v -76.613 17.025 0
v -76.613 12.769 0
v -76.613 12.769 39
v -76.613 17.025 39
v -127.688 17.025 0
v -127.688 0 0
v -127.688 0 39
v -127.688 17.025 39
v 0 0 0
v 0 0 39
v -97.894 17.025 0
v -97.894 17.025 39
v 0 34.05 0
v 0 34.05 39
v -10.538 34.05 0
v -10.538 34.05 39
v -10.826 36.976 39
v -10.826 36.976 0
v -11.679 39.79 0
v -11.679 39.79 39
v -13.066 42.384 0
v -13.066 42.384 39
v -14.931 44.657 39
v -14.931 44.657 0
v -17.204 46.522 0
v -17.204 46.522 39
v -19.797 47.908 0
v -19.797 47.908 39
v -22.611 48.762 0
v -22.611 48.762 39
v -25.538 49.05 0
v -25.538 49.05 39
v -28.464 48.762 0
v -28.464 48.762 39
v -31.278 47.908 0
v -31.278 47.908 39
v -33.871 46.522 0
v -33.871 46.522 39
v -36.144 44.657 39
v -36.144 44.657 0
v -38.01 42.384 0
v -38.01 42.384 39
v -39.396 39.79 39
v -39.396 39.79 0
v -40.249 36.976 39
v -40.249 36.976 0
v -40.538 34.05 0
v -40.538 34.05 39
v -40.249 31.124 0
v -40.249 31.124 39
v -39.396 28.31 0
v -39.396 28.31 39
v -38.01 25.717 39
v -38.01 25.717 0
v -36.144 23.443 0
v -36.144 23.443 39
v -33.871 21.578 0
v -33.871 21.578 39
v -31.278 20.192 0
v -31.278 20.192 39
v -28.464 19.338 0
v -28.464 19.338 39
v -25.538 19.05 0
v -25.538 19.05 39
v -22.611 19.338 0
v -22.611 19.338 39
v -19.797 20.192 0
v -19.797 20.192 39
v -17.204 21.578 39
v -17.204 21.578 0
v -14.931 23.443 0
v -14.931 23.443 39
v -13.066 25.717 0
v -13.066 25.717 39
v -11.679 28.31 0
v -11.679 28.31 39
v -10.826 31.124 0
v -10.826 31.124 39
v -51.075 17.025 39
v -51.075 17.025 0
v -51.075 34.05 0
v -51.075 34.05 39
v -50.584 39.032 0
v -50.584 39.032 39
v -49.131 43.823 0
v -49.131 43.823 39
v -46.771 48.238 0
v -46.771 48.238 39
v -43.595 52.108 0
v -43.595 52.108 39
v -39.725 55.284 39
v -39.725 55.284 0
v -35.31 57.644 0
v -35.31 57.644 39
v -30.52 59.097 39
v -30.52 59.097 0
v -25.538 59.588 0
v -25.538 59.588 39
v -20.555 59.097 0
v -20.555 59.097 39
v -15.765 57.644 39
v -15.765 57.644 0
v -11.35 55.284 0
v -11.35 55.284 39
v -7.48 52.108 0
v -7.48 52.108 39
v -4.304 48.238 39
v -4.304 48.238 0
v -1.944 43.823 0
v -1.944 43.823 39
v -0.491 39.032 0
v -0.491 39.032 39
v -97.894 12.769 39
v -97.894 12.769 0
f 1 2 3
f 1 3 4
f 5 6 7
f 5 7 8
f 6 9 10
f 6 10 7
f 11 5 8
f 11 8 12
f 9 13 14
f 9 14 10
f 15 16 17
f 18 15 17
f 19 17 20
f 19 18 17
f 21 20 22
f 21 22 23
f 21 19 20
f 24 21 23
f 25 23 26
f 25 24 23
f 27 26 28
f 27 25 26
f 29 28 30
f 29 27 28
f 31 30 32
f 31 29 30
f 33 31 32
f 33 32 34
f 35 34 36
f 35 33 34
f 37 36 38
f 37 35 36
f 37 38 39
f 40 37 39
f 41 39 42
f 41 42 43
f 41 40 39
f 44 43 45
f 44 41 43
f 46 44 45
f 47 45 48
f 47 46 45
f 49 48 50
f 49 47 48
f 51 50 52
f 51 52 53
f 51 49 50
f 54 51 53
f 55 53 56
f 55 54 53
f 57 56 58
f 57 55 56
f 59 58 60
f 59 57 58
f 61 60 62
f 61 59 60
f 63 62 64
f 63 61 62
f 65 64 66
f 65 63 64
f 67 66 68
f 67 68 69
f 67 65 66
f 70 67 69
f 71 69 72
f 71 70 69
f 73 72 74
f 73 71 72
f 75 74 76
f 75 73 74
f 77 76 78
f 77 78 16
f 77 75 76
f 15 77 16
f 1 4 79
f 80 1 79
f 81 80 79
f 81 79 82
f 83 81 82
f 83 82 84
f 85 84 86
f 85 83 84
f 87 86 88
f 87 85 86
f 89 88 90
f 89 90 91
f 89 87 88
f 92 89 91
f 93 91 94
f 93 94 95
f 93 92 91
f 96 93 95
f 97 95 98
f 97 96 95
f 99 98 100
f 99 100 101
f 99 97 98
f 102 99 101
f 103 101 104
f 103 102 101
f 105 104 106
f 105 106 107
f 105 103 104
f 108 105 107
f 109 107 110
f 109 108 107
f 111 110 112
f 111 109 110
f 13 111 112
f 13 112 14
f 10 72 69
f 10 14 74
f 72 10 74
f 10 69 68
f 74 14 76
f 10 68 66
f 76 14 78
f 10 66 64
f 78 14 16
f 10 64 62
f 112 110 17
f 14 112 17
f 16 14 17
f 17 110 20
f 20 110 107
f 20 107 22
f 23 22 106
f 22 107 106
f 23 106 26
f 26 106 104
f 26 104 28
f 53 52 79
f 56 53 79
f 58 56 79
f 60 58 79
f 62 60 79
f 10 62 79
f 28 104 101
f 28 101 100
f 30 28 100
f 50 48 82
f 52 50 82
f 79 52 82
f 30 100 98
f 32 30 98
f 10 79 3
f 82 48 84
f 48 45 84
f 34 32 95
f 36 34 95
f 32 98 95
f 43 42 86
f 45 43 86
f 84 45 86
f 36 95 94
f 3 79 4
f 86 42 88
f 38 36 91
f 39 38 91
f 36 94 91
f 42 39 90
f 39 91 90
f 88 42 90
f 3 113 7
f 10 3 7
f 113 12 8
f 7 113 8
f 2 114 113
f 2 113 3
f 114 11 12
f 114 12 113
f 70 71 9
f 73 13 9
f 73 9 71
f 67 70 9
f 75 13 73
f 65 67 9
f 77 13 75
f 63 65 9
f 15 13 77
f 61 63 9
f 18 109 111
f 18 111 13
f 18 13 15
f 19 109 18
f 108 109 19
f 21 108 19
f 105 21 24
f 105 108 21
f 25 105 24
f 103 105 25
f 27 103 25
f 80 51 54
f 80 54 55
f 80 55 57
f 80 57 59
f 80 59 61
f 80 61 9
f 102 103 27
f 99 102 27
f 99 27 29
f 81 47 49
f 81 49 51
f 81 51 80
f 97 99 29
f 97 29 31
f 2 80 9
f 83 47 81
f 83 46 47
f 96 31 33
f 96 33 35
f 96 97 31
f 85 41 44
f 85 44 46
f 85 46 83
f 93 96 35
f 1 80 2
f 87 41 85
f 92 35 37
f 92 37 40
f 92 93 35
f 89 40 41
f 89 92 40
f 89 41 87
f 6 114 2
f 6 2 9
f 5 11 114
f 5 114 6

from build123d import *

# Parameters (mm, degrees)
SKETCH2_R           = 15
BOSS_EXTRUDE1_DEPTH = 39


with BuildPart() as part:
    # Sketch2 → Boss-Extrude1 (new body)
    with BuildSketch(Plane.XY):
        with BuildLine():
            Line((0, 0), (-127.68773646, 0))
            Line((-127.68773646, 0), (-127.68773646, 17.025031528))
            Line((-127.68773646, 17.025031528), (-97.893931286, 17.025031528))
            Line((-97.893931286, 17.025031528), (-97.893931286, 12.768773646))
            Line((-97.893931286, 12.768773646), (-76.612641876, 12.768773646))
            Line((-76.612641876, 12.768773646), (-76.612641876, 17.025031528))
            Line((-76.612641876, 17.025031528), (-51.075094584, 17.025031528))
            Line((-51.075094584, 17.025031528), (-51.075094584, 34.050063056))
            ThreePointArc((-51.075094584, 34.050063056), (-25.537547292, 59.587610348), (0, 34.050063056))
            Line((0, 34.050063056), (0, 0))
        make_face()
        with Locations((-25.537547292, 34.050063056)):
            Circle(SKETCH2_R, mode=Mode.SUBTRACT)
    extrude(amount=BOSS_EXTRUDE1_DEPTH)


solid = part.part
